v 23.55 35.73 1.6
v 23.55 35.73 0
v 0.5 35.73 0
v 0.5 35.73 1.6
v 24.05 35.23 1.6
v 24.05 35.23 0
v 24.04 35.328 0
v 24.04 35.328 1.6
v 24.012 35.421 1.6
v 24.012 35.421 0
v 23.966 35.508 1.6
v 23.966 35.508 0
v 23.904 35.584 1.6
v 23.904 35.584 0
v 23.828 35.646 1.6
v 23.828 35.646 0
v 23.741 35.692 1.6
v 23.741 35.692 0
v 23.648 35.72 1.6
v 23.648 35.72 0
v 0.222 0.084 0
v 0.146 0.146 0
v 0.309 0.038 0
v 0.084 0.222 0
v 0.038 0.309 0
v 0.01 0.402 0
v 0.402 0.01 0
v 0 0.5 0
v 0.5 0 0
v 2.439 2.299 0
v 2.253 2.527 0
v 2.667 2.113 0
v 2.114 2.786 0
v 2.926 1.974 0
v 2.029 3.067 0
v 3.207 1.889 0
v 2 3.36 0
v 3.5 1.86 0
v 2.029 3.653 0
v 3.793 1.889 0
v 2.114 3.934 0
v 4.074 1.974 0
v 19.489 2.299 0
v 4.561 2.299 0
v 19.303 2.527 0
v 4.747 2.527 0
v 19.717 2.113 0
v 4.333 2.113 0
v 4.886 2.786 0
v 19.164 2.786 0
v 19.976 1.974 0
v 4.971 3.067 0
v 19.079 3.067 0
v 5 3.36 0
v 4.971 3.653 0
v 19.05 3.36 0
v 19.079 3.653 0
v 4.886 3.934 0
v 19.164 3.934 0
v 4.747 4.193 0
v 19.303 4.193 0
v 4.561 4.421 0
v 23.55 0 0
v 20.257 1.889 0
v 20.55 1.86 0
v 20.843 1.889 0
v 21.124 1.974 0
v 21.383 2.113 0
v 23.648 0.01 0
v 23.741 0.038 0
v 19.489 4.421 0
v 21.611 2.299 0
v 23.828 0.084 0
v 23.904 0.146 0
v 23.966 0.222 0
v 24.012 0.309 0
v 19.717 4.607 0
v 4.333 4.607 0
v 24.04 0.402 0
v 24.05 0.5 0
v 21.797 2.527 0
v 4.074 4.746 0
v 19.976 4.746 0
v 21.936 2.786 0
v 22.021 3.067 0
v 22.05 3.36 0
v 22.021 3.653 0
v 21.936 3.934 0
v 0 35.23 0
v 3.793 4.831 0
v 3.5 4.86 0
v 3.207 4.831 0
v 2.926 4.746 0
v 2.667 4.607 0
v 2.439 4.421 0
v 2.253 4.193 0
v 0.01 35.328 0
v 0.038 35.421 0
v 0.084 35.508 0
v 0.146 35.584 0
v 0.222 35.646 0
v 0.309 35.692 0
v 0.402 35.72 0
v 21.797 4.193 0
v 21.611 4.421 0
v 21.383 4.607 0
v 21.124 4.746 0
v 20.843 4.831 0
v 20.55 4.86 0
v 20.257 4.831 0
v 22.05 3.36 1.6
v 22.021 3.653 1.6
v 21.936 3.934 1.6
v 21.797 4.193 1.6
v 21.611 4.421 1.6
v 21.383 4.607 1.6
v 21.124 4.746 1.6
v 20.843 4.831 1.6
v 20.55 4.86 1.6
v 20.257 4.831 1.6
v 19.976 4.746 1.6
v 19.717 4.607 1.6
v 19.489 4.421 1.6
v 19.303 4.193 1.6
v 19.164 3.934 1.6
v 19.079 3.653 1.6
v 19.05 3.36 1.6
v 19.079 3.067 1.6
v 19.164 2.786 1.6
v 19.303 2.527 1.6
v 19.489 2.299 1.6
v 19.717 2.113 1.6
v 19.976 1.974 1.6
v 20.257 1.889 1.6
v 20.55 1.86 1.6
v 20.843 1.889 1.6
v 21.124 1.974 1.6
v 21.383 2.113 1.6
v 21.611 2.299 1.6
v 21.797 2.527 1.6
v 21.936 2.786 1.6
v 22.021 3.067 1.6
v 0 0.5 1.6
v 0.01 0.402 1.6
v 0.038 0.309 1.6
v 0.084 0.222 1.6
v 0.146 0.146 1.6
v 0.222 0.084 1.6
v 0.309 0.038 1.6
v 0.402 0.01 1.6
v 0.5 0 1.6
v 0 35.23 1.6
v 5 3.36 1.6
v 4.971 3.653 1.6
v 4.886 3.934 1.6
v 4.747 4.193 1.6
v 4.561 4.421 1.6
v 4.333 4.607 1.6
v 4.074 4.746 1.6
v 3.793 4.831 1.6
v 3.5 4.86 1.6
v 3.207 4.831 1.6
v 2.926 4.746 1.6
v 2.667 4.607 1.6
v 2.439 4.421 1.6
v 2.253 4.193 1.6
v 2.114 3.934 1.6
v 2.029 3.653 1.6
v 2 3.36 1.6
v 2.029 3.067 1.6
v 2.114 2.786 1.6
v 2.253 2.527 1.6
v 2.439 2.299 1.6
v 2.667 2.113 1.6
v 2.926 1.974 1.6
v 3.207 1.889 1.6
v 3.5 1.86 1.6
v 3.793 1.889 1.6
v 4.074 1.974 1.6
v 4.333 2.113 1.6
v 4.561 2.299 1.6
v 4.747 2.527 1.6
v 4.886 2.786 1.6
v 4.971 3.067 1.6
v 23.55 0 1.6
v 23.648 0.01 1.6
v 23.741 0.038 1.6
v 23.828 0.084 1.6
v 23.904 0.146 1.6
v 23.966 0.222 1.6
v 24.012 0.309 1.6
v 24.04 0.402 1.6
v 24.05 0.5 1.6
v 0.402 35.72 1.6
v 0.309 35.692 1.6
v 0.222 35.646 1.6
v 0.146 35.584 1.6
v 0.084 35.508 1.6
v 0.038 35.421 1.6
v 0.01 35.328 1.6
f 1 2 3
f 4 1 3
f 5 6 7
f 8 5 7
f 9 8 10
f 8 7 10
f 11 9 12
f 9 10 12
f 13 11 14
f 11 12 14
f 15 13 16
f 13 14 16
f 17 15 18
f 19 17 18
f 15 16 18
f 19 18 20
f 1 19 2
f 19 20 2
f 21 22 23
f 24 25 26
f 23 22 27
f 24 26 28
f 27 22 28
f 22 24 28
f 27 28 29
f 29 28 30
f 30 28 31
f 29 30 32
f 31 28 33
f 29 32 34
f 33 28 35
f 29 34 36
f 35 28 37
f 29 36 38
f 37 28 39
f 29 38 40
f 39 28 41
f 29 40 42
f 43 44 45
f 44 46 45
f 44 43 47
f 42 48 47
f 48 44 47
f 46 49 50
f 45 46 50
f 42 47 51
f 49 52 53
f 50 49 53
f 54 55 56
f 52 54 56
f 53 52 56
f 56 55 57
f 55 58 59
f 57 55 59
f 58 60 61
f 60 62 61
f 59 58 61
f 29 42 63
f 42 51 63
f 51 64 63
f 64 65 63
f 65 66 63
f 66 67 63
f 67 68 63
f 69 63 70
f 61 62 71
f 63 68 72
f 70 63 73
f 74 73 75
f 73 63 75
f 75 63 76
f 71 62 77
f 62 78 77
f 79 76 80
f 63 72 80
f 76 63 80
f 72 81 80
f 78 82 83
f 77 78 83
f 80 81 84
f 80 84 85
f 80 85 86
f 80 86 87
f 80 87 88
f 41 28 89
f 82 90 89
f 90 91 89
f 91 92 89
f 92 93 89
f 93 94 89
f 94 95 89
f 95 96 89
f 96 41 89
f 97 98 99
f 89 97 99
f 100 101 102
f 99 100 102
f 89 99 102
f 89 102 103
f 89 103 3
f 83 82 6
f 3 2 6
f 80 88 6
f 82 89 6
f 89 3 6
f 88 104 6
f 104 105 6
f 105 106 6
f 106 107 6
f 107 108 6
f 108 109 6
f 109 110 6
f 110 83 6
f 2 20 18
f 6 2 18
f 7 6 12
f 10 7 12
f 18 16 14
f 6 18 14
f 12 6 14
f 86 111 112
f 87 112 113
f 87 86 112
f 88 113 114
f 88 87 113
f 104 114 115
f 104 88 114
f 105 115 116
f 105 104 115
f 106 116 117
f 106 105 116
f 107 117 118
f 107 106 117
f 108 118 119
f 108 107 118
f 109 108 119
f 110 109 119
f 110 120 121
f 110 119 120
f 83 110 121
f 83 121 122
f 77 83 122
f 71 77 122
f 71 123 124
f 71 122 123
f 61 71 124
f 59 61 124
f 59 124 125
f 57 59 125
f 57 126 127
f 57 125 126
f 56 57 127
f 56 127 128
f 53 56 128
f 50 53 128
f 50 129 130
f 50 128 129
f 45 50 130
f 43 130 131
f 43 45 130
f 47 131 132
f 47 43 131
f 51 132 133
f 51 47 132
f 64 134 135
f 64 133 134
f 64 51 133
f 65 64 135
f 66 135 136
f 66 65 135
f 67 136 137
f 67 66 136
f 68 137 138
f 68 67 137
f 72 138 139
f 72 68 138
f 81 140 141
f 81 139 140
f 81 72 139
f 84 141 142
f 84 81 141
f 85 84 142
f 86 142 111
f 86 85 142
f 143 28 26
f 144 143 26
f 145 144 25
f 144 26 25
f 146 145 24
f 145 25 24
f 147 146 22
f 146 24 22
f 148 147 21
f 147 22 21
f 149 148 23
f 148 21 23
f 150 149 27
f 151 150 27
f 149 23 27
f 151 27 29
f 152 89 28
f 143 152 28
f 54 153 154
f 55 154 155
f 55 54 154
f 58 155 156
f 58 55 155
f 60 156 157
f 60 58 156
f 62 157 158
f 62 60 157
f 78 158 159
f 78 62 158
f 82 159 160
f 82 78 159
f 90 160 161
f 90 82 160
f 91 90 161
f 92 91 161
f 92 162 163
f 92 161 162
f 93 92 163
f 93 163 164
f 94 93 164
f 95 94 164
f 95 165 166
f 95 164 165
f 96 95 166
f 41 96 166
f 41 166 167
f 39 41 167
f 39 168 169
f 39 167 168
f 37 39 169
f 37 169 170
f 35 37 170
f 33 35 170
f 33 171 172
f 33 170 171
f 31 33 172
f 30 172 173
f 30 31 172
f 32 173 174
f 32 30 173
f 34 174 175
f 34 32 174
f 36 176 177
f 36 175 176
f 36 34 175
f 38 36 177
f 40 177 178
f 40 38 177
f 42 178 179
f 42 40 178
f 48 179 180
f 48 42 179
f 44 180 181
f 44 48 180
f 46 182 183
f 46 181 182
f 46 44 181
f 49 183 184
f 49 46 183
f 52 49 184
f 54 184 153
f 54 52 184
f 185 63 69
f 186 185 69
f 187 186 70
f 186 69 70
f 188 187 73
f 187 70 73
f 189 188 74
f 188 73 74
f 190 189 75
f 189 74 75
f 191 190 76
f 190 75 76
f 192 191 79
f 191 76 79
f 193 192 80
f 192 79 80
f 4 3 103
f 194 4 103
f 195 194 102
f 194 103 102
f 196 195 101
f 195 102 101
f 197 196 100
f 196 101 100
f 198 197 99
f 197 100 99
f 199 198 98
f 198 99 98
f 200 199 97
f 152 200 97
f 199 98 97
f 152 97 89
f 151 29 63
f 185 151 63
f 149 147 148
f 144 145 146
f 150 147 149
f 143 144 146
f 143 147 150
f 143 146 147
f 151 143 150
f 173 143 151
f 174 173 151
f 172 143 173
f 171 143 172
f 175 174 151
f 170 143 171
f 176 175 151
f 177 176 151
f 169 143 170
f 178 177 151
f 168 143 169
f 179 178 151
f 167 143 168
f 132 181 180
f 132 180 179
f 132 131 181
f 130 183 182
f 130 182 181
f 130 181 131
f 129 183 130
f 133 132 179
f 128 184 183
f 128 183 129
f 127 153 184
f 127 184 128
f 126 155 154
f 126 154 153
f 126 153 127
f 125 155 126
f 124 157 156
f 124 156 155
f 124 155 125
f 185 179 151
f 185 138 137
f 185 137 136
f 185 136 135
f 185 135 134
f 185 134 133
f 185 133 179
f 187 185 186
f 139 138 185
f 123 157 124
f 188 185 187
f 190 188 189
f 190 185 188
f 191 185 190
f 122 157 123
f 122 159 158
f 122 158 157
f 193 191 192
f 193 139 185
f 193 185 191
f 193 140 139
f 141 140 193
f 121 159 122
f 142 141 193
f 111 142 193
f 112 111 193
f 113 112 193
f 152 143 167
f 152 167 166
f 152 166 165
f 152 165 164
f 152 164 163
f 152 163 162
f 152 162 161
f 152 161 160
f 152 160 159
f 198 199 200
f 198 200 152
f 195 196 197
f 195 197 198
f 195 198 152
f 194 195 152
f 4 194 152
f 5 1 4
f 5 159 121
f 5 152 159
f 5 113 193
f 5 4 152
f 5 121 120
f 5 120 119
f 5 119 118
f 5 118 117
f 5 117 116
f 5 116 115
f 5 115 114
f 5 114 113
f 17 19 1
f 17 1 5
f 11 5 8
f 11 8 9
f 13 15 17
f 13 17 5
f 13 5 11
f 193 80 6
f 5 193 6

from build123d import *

# Parameters (mm, degrees)
MEASURED_BUTTON_PCB_DEPTH         = 1.6
SKETCH_2_R                        = 1.5
MEASURED_BUTTON_MOUNT_HOLES_DEPTH = 2


with BuildPart() as part:
    # 草图1 → Measured_button_PCB (new body)
    with BuildSketch(Plane.XY):
        with BuildLine():
            Line((0.5, 0), (23.55, 0))
            ThreePointArc((23.55, 0), (23.903553391, 0.146446609), (24.05, 0.5))
            Line((24.05, 0.5), (24.05, 35.23))
            ThreePointArc((24.05, 35.23), (23.903553391, 35.583553391), (23.55, 35.73))
            Line((23.55, 35.73), (0.5, 35.73))
            ThreePointArc((0.5, 35.73), (0.146446609, 35.583553391), (0, 35.23))
            Line((0, 35.23), (0, 0.5))
            ThreePointArc((0, 0.5), (0.146446609, 0.146446609), (0.5, 0))
        make_face()
    extrude(amount=MEASURED_BUTTON_PCB_DEPTH)

    # 草图2 → Measured_button_mount_holes (cut)
    with BuildSketch(Plane.XY):
        with Locations((3.5, 3.36)):
            Circle(SKETCH_2_R)
        with Locations((20.55, 3.36)):
            Circle(SKETCH_2_R)
    extrude(amount=MEASURED_BUTTON_MOUNT_HOLES_DEPTH, mode=Mode.SUBTRACT)


solid = part.part
